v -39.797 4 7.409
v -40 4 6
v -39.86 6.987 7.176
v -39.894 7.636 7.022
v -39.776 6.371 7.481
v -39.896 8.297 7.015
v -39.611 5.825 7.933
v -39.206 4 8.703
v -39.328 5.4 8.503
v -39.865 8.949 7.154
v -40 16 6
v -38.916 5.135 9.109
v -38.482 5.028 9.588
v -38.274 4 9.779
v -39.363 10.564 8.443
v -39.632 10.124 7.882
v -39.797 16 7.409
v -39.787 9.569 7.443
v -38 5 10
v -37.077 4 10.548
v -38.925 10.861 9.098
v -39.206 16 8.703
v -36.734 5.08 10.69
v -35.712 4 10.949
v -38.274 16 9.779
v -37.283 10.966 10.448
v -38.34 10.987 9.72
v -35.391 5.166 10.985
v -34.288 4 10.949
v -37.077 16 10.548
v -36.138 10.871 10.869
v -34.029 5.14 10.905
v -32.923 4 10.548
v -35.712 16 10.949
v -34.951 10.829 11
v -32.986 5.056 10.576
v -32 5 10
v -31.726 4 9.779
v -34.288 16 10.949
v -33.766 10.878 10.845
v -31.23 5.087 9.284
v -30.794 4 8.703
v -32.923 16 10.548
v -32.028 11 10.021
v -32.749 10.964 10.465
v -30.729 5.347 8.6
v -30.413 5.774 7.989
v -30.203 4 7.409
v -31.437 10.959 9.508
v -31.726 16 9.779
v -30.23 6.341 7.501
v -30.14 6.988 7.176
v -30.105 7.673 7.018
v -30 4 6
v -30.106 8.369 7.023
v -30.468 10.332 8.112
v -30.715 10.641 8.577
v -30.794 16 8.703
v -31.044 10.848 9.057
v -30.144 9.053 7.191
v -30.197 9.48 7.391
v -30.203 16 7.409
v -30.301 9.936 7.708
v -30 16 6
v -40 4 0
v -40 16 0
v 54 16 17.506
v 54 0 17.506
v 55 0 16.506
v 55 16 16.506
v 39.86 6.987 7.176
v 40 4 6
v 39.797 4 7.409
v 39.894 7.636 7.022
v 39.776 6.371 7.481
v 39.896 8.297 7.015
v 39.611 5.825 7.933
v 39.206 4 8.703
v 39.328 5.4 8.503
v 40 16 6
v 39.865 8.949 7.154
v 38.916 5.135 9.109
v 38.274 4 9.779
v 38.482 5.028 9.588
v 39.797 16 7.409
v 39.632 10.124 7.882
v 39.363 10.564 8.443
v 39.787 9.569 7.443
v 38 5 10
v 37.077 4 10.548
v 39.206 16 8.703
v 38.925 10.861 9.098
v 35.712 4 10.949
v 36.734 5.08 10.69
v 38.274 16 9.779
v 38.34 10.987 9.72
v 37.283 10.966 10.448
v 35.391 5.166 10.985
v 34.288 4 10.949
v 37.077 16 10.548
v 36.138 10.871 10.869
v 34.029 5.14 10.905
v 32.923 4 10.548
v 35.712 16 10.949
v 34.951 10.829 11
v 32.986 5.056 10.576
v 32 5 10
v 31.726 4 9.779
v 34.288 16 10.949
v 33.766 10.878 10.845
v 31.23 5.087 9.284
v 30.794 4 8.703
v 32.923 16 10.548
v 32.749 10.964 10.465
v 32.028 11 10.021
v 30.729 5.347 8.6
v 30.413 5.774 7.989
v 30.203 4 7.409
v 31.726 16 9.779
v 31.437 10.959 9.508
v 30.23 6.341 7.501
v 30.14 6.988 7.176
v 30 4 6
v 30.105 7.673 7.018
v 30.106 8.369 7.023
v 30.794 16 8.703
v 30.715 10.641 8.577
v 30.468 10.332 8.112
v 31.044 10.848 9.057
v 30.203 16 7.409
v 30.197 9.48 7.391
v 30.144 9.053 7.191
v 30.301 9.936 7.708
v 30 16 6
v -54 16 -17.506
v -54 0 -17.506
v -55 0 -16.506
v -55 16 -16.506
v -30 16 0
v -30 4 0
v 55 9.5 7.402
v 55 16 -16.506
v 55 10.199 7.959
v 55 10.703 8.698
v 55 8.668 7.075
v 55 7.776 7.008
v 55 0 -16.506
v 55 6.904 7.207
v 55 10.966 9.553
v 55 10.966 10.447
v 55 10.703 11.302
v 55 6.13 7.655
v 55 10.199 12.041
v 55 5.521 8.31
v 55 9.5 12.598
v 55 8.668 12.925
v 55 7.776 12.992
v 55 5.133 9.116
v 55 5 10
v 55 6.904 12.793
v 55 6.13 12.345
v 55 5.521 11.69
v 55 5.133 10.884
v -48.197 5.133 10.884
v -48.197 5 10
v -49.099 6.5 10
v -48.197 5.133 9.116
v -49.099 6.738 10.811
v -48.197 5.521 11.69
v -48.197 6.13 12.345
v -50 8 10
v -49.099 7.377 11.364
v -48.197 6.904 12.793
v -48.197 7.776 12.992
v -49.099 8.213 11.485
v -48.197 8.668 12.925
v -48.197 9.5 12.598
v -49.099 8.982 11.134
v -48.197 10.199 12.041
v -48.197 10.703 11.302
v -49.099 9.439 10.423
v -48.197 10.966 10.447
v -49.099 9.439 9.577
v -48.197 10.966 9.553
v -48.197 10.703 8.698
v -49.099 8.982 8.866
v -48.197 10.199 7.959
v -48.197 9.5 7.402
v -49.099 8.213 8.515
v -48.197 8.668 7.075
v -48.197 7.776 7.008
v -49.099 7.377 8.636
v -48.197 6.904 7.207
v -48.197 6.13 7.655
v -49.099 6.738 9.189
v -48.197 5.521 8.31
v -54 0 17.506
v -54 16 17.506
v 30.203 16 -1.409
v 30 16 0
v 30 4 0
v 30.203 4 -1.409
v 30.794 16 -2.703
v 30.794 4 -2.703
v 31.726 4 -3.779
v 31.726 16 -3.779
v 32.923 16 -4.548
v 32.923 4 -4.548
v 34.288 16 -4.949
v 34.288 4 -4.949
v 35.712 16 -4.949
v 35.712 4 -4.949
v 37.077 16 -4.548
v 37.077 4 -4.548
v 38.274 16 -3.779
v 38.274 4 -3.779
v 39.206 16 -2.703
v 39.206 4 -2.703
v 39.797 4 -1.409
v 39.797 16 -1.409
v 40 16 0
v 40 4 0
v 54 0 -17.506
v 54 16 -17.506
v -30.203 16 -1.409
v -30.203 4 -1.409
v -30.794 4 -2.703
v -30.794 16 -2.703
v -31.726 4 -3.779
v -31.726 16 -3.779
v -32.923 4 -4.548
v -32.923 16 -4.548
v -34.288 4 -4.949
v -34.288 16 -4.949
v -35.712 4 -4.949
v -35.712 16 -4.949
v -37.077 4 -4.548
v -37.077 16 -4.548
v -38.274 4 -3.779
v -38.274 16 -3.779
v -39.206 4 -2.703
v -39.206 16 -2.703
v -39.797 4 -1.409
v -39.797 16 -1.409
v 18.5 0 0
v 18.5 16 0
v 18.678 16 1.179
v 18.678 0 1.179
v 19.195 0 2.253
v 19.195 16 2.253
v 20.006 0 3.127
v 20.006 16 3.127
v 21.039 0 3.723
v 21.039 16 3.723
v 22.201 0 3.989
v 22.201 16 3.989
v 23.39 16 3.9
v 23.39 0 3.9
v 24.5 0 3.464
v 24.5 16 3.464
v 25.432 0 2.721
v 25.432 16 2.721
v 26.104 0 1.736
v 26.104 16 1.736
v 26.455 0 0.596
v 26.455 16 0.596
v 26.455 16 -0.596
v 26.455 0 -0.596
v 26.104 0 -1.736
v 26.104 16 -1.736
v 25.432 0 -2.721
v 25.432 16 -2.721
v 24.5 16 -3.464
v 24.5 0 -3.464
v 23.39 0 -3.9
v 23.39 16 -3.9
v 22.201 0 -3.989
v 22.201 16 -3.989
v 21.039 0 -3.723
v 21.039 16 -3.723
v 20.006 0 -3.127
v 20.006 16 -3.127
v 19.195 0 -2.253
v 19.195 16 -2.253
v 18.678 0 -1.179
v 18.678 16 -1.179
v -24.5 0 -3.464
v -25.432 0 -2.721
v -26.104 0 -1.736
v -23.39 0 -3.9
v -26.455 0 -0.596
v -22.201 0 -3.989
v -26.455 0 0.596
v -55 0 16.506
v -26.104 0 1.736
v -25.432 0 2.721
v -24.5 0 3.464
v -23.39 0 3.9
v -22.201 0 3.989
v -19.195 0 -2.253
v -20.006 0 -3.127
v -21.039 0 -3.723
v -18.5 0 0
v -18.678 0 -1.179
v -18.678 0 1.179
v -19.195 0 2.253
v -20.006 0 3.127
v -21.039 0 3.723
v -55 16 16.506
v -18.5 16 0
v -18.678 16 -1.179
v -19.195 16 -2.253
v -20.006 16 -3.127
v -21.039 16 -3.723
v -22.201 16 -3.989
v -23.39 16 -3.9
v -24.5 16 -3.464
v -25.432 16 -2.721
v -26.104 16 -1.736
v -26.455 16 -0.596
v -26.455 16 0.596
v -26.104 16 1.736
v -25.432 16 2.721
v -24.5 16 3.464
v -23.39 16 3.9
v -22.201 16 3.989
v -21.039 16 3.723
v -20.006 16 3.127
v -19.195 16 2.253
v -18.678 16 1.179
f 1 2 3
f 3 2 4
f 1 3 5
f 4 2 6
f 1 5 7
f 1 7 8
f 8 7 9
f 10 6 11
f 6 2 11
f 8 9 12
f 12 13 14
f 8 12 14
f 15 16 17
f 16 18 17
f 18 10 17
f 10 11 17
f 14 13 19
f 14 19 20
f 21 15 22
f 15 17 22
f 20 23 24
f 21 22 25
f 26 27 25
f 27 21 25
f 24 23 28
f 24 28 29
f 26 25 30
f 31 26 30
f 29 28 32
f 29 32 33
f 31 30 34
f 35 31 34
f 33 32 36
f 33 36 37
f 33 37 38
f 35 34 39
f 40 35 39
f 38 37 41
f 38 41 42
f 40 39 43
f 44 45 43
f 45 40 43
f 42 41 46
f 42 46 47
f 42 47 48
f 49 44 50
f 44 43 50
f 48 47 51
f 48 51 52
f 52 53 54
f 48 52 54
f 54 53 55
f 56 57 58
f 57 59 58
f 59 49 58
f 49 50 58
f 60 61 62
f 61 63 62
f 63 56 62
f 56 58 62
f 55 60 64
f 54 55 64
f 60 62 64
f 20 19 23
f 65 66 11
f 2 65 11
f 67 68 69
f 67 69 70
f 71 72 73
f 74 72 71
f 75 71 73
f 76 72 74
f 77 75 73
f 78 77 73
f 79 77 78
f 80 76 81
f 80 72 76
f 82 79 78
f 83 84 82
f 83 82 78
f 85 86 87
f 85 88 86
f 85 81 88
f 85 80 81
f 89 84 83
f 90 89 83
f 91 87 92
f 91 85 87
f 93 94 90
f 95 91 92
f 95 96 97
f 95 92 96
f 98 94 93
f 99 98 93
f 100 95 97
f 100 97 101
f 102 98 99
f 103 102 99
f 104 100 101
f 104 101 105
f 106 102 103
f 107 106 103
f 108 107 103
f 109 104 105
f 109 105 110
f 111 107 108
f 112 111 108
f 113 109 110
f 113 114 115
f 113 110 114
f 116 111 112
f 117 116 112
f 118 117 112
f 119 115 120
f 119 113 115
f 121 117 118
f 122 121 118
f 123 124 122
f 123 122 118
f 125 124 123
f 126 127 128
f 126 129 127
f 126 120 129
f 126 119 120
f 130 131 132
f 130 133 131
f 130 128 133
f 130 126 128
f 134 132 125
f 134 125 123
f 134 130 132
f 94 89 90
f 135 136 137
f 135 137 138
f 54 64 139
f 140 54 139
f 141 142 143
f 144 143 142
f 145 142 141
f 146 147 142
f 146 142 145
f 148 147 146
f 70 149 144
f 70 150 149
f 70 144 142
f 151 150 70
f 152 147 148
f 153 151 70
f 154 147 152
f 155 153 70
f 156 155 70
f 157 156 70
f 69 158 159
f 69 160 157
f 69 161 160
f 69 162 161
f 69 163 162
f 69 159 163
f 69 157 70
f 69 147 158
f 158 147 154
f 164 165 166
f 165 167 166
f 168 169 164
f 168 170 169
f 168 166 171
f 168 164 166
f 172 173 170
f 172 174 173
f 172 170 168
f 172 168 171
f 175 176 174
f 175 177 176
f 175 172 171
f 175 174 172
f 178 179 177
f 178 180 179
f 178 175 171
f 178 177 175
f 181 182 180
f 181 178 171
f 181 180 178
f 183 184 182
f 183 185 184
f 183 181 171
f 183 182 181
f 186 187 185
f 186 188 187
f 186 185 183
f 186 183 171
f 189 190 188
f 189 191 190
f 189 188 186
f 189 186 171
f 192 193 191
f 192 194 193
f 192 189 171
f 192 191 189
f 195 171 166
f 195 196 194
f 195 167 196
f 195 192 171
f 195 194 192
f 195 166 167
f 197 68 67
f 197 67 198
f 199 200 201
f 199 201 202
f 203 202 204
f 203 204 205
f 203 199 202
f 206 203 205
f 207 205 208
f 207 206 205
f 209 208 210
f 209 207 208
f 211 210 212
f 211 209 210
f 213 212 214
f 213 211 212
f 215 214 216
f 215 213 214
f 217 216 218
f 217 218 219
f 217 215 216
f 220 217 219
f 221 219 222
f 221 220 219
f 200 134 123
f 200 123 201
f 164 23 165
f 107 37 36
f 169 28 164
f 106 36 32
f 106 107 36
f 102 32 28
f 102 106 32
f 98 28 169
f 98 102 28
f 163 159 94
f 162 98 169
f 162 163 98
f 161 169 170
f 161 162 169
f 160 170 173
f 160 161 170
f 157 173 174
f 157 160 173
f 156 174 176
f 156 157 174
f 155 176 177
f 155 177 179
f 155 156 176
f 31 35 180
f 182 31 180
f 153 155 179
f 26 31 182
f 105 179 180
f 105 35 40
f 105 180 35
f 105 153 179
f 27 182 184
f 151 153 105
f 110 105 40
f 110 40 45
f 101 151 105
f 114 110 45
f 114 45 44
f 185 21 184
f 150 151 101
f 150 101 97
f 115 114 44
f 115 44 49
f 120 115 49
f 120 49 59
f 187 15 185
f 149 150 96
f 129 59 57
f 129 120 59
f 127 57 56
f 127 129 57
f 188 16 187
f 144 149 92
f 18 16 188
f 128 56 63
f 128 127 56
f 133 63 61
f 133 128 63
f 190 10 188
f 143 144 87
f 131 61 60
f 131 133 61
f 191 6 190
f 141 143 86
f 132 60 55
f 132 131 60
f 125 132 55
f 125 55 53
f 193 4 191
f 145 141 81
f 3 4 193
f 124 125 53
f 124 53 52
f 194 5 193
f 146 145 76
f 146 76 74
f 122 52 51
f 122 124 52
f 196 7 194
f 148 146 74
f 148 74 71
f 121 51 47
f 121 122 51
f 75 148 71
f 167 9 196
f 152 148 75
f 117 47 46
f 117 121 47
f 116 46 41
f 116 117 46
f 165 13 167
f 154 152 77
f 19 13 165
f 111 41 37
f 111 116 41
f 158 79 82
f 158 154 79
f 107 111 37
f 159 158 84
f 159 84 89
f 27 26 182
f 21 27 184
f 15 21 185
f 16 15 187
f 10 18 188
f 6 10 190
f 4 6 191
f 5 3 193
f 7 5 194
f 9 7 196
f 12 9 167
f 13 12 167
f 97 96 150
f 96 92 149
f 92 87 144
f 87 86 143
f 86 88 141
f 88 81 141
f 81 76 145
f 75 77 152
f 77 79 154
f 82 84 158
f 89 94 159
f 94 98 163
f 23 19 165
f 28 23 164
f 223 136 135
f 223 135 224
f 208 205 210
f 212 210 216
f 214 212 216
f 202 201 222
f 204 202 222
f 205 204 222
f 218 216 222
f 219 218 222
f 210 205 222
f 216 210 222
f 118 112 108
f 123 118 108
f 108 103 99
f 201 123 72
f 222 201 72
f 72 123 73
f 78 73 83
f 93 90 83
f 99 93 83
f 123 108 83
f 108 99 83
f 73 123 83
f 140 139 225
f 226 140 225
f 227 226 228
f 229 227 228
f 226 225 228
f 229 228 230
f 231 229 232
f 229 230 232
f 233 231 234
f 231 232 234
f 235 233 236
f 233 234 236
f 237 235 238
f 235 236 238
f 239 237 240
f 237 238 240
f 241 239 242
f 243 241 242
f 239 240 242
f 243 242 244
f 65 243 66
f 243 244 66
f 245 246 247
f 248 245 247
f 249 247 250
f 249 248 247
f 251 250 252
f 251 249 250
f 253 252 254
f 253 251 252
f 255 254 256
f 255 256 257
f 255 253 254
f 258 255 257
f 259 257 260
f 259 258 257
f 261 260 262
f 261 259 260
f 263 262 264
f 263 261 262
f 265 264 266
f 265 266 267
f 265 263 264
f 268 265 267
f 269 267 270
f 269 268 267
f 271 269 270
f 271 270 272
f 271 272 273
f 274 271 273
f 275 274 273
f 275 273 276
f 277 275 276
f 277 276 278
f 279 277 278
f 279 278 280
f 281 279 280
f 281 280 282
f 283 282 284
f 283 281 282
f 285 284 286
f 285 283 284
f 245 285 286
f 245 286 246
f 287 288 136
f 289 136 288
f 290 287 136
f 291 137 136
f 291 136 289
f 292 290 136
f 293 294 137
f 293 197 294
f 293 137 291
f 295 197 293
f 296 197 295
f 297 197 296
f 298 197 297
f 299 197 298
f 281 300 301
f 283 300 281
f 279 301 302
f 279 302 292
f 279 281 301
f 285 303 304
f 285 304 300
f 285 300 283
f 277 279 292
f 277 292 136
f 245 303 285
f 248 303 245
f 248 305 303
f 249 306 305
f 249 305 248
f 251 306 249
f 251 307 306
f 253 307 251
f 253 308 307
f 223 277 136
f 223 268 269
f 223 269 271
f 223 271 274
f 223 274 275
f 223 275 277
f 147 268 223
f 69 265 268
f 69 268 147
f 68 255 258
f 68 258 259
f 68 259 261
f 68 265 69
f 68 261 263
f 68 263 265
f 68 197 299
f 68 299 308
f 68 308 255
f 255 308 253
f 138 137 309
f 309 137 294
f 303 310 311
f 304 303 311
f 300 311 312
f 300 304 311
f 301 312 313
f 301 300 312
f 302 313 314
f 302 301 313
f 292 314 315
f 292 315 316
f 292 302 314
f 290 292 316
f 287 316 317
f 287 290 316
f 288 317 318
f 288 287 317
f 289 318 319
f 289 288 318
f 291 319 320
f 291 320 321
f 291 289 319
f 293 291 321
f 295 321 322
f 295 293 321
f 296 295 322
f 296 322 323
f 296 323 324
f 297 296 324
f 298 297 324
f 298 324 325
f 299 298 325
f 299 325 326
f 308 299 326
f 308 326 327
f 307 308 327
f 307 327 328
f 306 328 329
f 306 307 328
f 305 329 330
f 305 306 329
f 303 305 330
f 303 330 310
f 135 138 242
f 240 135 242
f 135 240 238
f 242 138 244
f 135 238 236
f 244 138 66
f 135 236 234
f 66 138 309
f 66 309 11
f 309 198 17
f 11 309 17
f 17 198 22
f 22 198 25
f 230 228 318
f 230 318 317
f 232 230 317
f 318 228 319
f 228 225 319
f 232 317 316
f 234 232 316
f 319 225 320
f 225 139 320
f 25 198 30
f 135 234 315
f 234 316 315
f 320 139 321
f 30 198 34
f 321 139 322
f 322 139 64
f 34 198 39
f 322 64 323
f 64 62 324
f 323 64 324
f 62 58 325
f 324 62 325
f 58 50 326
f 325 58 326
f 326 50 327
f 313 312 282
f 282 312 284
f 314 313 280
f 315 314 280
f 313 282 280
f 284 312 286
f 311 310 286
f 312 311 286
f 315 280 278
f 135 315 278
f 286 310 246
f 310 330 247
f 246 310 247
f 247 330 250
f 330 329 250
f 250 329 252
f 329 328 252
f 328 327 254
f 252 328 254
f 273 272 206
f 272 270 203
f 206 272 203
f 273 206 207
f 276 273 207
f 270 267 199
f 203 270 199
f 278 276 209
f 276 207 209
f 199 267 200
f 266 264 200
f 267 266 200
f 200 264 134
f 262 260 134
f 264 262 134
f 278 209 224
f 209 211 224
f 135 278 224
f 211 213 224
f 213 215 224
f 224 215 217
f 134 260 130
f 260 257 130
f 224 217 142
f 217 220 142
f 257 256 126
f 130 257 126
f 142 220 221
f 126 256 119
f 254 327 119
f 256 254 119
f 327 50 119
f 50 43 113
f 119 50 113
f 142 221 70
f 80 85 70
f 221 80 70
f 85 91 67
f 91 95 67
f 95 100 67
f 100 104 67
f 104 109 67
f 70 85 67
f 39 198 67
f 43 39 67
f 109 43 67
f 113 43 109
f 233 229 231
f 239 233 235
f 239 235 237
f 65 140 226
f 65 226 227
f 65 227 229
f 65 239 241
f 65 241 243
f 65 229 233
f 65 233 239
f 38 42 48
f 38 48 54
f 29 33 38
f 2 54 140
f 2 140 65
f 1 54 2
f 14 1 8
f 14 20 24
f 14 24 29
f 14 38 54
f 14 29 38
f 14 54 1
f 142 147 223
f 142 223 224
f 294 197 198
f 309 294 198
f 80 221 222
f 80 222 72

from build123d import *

# Parameters (mm, degrees)
F1_W     = 10
F1_H     = 35.0110880776
F1_W_2   = 90
F1_R     = 5
F2_DEPTH = 16
F3_SIZE  = 1
F7_DEPTH = 12


# Not quite as in the source:
# - a feature of the source that left no trace in its solid (it failed there, or was rolled back) is left out
# - a pattern or mirror of a feature is missing from the dataset's text; its kind, count and spacing are read off the source's solid


with BuildPart() as f2:
    # F1 (on Front) → F2 (new body)
    with BuildSketch(Plane.XZ):
        with Locations((-50, 0)):
            Rectangle(F1_W, F1_H)
        Rectangle(F1_W_2, F1_H)
        with Locations((-35, 0)):
            Circle(F1_R, mode=Mode.SUBTRACT)
        with BuildLine():
            ThreePointArc((-26.5, 0), (-22.5, 4), (-18.5, 0))
            ThreePointArc((-18.5, 0), (-22.5, -4), (-26.5, 0))
        make_face(mode=Mode.SUBTRACT)
        with BuildLine():
            ThreePointArc((26.5, 0), (22.5, -4), (18.5, 0))
            ThreePointArc((18.5, 0), (22.5, 4), (26.5, 0))
        make_face(mode=Mode.SUBTRACT)
        with BuildLine():
            ThreePointArc((40, 0), (35, -5), (30, 0))
            ThreePointArc((30, 0), (35, 5), (40, 0))
        make_face(mode=Mode.SUBTRACT)
        with Locations((-35, 0)):
            Circle(F1_R)
        with BuildLine():
            ThreePointArc((40, 0), (35, 5), (30, 0))
            ThreePointArc((30, 0), (35, -5), (40, 0))
        make_face()
        with Locations((50, 0)):
            Rectangle(F1_W, F1_H)
    extrude(amount=-F2_DEPTH)

    # F3
    f3_edges = [f2.edges().sort_by_distance(p)[0] for p in [
        (55, 8, -17.505544),
        (55, 8, 17.505544),
        (-55, 8, -17.505544),
        (-55, 8, 17.505544),
    ]]
    chamfer(f3_edges, length=F3_SIZE)

    # F4 (on offset) → F5 (revolve, cut)
    with BuildSketch(Plane.XY.offset(10)):
        Polygon((57.6581534887, 5), (57.6581534887, 8), (-50, 8), (-48.1974181429, 5), align=None)
    revolve(axis=Axis((3.8290767443, 8, 10), (-1, 0, 0)), mode=Mode.SUBTRACT)

    # F6 (on face) → F7 (cut)
    with BuildSketch(Plane(origin=(0, 16, 0), x_dir=(-1, 0, 0), z_dir=(0, 1, 0))):
        with BuildLine():
            Line((30, 6), (30, 0))
            ThreePointArc((30, 0), (35, -5), (40, 0))
            Line((40, 0), (40, 6))
            ThreePointArc((40, 6), (35, 11), (30, 6))
        make_face()
    f7 = extrude(amount=-F7_DEPTH, mode=Mode.SUBTRACT)

    # F7_copies: F7 across plane
    add(f7.mirror(Plane(origin=(0, 0, 0), x_dir=(0, 0, 1), z_dir=(1, 0, 0))), mode=Mode.SUBTRACT)


solid = f2.part
